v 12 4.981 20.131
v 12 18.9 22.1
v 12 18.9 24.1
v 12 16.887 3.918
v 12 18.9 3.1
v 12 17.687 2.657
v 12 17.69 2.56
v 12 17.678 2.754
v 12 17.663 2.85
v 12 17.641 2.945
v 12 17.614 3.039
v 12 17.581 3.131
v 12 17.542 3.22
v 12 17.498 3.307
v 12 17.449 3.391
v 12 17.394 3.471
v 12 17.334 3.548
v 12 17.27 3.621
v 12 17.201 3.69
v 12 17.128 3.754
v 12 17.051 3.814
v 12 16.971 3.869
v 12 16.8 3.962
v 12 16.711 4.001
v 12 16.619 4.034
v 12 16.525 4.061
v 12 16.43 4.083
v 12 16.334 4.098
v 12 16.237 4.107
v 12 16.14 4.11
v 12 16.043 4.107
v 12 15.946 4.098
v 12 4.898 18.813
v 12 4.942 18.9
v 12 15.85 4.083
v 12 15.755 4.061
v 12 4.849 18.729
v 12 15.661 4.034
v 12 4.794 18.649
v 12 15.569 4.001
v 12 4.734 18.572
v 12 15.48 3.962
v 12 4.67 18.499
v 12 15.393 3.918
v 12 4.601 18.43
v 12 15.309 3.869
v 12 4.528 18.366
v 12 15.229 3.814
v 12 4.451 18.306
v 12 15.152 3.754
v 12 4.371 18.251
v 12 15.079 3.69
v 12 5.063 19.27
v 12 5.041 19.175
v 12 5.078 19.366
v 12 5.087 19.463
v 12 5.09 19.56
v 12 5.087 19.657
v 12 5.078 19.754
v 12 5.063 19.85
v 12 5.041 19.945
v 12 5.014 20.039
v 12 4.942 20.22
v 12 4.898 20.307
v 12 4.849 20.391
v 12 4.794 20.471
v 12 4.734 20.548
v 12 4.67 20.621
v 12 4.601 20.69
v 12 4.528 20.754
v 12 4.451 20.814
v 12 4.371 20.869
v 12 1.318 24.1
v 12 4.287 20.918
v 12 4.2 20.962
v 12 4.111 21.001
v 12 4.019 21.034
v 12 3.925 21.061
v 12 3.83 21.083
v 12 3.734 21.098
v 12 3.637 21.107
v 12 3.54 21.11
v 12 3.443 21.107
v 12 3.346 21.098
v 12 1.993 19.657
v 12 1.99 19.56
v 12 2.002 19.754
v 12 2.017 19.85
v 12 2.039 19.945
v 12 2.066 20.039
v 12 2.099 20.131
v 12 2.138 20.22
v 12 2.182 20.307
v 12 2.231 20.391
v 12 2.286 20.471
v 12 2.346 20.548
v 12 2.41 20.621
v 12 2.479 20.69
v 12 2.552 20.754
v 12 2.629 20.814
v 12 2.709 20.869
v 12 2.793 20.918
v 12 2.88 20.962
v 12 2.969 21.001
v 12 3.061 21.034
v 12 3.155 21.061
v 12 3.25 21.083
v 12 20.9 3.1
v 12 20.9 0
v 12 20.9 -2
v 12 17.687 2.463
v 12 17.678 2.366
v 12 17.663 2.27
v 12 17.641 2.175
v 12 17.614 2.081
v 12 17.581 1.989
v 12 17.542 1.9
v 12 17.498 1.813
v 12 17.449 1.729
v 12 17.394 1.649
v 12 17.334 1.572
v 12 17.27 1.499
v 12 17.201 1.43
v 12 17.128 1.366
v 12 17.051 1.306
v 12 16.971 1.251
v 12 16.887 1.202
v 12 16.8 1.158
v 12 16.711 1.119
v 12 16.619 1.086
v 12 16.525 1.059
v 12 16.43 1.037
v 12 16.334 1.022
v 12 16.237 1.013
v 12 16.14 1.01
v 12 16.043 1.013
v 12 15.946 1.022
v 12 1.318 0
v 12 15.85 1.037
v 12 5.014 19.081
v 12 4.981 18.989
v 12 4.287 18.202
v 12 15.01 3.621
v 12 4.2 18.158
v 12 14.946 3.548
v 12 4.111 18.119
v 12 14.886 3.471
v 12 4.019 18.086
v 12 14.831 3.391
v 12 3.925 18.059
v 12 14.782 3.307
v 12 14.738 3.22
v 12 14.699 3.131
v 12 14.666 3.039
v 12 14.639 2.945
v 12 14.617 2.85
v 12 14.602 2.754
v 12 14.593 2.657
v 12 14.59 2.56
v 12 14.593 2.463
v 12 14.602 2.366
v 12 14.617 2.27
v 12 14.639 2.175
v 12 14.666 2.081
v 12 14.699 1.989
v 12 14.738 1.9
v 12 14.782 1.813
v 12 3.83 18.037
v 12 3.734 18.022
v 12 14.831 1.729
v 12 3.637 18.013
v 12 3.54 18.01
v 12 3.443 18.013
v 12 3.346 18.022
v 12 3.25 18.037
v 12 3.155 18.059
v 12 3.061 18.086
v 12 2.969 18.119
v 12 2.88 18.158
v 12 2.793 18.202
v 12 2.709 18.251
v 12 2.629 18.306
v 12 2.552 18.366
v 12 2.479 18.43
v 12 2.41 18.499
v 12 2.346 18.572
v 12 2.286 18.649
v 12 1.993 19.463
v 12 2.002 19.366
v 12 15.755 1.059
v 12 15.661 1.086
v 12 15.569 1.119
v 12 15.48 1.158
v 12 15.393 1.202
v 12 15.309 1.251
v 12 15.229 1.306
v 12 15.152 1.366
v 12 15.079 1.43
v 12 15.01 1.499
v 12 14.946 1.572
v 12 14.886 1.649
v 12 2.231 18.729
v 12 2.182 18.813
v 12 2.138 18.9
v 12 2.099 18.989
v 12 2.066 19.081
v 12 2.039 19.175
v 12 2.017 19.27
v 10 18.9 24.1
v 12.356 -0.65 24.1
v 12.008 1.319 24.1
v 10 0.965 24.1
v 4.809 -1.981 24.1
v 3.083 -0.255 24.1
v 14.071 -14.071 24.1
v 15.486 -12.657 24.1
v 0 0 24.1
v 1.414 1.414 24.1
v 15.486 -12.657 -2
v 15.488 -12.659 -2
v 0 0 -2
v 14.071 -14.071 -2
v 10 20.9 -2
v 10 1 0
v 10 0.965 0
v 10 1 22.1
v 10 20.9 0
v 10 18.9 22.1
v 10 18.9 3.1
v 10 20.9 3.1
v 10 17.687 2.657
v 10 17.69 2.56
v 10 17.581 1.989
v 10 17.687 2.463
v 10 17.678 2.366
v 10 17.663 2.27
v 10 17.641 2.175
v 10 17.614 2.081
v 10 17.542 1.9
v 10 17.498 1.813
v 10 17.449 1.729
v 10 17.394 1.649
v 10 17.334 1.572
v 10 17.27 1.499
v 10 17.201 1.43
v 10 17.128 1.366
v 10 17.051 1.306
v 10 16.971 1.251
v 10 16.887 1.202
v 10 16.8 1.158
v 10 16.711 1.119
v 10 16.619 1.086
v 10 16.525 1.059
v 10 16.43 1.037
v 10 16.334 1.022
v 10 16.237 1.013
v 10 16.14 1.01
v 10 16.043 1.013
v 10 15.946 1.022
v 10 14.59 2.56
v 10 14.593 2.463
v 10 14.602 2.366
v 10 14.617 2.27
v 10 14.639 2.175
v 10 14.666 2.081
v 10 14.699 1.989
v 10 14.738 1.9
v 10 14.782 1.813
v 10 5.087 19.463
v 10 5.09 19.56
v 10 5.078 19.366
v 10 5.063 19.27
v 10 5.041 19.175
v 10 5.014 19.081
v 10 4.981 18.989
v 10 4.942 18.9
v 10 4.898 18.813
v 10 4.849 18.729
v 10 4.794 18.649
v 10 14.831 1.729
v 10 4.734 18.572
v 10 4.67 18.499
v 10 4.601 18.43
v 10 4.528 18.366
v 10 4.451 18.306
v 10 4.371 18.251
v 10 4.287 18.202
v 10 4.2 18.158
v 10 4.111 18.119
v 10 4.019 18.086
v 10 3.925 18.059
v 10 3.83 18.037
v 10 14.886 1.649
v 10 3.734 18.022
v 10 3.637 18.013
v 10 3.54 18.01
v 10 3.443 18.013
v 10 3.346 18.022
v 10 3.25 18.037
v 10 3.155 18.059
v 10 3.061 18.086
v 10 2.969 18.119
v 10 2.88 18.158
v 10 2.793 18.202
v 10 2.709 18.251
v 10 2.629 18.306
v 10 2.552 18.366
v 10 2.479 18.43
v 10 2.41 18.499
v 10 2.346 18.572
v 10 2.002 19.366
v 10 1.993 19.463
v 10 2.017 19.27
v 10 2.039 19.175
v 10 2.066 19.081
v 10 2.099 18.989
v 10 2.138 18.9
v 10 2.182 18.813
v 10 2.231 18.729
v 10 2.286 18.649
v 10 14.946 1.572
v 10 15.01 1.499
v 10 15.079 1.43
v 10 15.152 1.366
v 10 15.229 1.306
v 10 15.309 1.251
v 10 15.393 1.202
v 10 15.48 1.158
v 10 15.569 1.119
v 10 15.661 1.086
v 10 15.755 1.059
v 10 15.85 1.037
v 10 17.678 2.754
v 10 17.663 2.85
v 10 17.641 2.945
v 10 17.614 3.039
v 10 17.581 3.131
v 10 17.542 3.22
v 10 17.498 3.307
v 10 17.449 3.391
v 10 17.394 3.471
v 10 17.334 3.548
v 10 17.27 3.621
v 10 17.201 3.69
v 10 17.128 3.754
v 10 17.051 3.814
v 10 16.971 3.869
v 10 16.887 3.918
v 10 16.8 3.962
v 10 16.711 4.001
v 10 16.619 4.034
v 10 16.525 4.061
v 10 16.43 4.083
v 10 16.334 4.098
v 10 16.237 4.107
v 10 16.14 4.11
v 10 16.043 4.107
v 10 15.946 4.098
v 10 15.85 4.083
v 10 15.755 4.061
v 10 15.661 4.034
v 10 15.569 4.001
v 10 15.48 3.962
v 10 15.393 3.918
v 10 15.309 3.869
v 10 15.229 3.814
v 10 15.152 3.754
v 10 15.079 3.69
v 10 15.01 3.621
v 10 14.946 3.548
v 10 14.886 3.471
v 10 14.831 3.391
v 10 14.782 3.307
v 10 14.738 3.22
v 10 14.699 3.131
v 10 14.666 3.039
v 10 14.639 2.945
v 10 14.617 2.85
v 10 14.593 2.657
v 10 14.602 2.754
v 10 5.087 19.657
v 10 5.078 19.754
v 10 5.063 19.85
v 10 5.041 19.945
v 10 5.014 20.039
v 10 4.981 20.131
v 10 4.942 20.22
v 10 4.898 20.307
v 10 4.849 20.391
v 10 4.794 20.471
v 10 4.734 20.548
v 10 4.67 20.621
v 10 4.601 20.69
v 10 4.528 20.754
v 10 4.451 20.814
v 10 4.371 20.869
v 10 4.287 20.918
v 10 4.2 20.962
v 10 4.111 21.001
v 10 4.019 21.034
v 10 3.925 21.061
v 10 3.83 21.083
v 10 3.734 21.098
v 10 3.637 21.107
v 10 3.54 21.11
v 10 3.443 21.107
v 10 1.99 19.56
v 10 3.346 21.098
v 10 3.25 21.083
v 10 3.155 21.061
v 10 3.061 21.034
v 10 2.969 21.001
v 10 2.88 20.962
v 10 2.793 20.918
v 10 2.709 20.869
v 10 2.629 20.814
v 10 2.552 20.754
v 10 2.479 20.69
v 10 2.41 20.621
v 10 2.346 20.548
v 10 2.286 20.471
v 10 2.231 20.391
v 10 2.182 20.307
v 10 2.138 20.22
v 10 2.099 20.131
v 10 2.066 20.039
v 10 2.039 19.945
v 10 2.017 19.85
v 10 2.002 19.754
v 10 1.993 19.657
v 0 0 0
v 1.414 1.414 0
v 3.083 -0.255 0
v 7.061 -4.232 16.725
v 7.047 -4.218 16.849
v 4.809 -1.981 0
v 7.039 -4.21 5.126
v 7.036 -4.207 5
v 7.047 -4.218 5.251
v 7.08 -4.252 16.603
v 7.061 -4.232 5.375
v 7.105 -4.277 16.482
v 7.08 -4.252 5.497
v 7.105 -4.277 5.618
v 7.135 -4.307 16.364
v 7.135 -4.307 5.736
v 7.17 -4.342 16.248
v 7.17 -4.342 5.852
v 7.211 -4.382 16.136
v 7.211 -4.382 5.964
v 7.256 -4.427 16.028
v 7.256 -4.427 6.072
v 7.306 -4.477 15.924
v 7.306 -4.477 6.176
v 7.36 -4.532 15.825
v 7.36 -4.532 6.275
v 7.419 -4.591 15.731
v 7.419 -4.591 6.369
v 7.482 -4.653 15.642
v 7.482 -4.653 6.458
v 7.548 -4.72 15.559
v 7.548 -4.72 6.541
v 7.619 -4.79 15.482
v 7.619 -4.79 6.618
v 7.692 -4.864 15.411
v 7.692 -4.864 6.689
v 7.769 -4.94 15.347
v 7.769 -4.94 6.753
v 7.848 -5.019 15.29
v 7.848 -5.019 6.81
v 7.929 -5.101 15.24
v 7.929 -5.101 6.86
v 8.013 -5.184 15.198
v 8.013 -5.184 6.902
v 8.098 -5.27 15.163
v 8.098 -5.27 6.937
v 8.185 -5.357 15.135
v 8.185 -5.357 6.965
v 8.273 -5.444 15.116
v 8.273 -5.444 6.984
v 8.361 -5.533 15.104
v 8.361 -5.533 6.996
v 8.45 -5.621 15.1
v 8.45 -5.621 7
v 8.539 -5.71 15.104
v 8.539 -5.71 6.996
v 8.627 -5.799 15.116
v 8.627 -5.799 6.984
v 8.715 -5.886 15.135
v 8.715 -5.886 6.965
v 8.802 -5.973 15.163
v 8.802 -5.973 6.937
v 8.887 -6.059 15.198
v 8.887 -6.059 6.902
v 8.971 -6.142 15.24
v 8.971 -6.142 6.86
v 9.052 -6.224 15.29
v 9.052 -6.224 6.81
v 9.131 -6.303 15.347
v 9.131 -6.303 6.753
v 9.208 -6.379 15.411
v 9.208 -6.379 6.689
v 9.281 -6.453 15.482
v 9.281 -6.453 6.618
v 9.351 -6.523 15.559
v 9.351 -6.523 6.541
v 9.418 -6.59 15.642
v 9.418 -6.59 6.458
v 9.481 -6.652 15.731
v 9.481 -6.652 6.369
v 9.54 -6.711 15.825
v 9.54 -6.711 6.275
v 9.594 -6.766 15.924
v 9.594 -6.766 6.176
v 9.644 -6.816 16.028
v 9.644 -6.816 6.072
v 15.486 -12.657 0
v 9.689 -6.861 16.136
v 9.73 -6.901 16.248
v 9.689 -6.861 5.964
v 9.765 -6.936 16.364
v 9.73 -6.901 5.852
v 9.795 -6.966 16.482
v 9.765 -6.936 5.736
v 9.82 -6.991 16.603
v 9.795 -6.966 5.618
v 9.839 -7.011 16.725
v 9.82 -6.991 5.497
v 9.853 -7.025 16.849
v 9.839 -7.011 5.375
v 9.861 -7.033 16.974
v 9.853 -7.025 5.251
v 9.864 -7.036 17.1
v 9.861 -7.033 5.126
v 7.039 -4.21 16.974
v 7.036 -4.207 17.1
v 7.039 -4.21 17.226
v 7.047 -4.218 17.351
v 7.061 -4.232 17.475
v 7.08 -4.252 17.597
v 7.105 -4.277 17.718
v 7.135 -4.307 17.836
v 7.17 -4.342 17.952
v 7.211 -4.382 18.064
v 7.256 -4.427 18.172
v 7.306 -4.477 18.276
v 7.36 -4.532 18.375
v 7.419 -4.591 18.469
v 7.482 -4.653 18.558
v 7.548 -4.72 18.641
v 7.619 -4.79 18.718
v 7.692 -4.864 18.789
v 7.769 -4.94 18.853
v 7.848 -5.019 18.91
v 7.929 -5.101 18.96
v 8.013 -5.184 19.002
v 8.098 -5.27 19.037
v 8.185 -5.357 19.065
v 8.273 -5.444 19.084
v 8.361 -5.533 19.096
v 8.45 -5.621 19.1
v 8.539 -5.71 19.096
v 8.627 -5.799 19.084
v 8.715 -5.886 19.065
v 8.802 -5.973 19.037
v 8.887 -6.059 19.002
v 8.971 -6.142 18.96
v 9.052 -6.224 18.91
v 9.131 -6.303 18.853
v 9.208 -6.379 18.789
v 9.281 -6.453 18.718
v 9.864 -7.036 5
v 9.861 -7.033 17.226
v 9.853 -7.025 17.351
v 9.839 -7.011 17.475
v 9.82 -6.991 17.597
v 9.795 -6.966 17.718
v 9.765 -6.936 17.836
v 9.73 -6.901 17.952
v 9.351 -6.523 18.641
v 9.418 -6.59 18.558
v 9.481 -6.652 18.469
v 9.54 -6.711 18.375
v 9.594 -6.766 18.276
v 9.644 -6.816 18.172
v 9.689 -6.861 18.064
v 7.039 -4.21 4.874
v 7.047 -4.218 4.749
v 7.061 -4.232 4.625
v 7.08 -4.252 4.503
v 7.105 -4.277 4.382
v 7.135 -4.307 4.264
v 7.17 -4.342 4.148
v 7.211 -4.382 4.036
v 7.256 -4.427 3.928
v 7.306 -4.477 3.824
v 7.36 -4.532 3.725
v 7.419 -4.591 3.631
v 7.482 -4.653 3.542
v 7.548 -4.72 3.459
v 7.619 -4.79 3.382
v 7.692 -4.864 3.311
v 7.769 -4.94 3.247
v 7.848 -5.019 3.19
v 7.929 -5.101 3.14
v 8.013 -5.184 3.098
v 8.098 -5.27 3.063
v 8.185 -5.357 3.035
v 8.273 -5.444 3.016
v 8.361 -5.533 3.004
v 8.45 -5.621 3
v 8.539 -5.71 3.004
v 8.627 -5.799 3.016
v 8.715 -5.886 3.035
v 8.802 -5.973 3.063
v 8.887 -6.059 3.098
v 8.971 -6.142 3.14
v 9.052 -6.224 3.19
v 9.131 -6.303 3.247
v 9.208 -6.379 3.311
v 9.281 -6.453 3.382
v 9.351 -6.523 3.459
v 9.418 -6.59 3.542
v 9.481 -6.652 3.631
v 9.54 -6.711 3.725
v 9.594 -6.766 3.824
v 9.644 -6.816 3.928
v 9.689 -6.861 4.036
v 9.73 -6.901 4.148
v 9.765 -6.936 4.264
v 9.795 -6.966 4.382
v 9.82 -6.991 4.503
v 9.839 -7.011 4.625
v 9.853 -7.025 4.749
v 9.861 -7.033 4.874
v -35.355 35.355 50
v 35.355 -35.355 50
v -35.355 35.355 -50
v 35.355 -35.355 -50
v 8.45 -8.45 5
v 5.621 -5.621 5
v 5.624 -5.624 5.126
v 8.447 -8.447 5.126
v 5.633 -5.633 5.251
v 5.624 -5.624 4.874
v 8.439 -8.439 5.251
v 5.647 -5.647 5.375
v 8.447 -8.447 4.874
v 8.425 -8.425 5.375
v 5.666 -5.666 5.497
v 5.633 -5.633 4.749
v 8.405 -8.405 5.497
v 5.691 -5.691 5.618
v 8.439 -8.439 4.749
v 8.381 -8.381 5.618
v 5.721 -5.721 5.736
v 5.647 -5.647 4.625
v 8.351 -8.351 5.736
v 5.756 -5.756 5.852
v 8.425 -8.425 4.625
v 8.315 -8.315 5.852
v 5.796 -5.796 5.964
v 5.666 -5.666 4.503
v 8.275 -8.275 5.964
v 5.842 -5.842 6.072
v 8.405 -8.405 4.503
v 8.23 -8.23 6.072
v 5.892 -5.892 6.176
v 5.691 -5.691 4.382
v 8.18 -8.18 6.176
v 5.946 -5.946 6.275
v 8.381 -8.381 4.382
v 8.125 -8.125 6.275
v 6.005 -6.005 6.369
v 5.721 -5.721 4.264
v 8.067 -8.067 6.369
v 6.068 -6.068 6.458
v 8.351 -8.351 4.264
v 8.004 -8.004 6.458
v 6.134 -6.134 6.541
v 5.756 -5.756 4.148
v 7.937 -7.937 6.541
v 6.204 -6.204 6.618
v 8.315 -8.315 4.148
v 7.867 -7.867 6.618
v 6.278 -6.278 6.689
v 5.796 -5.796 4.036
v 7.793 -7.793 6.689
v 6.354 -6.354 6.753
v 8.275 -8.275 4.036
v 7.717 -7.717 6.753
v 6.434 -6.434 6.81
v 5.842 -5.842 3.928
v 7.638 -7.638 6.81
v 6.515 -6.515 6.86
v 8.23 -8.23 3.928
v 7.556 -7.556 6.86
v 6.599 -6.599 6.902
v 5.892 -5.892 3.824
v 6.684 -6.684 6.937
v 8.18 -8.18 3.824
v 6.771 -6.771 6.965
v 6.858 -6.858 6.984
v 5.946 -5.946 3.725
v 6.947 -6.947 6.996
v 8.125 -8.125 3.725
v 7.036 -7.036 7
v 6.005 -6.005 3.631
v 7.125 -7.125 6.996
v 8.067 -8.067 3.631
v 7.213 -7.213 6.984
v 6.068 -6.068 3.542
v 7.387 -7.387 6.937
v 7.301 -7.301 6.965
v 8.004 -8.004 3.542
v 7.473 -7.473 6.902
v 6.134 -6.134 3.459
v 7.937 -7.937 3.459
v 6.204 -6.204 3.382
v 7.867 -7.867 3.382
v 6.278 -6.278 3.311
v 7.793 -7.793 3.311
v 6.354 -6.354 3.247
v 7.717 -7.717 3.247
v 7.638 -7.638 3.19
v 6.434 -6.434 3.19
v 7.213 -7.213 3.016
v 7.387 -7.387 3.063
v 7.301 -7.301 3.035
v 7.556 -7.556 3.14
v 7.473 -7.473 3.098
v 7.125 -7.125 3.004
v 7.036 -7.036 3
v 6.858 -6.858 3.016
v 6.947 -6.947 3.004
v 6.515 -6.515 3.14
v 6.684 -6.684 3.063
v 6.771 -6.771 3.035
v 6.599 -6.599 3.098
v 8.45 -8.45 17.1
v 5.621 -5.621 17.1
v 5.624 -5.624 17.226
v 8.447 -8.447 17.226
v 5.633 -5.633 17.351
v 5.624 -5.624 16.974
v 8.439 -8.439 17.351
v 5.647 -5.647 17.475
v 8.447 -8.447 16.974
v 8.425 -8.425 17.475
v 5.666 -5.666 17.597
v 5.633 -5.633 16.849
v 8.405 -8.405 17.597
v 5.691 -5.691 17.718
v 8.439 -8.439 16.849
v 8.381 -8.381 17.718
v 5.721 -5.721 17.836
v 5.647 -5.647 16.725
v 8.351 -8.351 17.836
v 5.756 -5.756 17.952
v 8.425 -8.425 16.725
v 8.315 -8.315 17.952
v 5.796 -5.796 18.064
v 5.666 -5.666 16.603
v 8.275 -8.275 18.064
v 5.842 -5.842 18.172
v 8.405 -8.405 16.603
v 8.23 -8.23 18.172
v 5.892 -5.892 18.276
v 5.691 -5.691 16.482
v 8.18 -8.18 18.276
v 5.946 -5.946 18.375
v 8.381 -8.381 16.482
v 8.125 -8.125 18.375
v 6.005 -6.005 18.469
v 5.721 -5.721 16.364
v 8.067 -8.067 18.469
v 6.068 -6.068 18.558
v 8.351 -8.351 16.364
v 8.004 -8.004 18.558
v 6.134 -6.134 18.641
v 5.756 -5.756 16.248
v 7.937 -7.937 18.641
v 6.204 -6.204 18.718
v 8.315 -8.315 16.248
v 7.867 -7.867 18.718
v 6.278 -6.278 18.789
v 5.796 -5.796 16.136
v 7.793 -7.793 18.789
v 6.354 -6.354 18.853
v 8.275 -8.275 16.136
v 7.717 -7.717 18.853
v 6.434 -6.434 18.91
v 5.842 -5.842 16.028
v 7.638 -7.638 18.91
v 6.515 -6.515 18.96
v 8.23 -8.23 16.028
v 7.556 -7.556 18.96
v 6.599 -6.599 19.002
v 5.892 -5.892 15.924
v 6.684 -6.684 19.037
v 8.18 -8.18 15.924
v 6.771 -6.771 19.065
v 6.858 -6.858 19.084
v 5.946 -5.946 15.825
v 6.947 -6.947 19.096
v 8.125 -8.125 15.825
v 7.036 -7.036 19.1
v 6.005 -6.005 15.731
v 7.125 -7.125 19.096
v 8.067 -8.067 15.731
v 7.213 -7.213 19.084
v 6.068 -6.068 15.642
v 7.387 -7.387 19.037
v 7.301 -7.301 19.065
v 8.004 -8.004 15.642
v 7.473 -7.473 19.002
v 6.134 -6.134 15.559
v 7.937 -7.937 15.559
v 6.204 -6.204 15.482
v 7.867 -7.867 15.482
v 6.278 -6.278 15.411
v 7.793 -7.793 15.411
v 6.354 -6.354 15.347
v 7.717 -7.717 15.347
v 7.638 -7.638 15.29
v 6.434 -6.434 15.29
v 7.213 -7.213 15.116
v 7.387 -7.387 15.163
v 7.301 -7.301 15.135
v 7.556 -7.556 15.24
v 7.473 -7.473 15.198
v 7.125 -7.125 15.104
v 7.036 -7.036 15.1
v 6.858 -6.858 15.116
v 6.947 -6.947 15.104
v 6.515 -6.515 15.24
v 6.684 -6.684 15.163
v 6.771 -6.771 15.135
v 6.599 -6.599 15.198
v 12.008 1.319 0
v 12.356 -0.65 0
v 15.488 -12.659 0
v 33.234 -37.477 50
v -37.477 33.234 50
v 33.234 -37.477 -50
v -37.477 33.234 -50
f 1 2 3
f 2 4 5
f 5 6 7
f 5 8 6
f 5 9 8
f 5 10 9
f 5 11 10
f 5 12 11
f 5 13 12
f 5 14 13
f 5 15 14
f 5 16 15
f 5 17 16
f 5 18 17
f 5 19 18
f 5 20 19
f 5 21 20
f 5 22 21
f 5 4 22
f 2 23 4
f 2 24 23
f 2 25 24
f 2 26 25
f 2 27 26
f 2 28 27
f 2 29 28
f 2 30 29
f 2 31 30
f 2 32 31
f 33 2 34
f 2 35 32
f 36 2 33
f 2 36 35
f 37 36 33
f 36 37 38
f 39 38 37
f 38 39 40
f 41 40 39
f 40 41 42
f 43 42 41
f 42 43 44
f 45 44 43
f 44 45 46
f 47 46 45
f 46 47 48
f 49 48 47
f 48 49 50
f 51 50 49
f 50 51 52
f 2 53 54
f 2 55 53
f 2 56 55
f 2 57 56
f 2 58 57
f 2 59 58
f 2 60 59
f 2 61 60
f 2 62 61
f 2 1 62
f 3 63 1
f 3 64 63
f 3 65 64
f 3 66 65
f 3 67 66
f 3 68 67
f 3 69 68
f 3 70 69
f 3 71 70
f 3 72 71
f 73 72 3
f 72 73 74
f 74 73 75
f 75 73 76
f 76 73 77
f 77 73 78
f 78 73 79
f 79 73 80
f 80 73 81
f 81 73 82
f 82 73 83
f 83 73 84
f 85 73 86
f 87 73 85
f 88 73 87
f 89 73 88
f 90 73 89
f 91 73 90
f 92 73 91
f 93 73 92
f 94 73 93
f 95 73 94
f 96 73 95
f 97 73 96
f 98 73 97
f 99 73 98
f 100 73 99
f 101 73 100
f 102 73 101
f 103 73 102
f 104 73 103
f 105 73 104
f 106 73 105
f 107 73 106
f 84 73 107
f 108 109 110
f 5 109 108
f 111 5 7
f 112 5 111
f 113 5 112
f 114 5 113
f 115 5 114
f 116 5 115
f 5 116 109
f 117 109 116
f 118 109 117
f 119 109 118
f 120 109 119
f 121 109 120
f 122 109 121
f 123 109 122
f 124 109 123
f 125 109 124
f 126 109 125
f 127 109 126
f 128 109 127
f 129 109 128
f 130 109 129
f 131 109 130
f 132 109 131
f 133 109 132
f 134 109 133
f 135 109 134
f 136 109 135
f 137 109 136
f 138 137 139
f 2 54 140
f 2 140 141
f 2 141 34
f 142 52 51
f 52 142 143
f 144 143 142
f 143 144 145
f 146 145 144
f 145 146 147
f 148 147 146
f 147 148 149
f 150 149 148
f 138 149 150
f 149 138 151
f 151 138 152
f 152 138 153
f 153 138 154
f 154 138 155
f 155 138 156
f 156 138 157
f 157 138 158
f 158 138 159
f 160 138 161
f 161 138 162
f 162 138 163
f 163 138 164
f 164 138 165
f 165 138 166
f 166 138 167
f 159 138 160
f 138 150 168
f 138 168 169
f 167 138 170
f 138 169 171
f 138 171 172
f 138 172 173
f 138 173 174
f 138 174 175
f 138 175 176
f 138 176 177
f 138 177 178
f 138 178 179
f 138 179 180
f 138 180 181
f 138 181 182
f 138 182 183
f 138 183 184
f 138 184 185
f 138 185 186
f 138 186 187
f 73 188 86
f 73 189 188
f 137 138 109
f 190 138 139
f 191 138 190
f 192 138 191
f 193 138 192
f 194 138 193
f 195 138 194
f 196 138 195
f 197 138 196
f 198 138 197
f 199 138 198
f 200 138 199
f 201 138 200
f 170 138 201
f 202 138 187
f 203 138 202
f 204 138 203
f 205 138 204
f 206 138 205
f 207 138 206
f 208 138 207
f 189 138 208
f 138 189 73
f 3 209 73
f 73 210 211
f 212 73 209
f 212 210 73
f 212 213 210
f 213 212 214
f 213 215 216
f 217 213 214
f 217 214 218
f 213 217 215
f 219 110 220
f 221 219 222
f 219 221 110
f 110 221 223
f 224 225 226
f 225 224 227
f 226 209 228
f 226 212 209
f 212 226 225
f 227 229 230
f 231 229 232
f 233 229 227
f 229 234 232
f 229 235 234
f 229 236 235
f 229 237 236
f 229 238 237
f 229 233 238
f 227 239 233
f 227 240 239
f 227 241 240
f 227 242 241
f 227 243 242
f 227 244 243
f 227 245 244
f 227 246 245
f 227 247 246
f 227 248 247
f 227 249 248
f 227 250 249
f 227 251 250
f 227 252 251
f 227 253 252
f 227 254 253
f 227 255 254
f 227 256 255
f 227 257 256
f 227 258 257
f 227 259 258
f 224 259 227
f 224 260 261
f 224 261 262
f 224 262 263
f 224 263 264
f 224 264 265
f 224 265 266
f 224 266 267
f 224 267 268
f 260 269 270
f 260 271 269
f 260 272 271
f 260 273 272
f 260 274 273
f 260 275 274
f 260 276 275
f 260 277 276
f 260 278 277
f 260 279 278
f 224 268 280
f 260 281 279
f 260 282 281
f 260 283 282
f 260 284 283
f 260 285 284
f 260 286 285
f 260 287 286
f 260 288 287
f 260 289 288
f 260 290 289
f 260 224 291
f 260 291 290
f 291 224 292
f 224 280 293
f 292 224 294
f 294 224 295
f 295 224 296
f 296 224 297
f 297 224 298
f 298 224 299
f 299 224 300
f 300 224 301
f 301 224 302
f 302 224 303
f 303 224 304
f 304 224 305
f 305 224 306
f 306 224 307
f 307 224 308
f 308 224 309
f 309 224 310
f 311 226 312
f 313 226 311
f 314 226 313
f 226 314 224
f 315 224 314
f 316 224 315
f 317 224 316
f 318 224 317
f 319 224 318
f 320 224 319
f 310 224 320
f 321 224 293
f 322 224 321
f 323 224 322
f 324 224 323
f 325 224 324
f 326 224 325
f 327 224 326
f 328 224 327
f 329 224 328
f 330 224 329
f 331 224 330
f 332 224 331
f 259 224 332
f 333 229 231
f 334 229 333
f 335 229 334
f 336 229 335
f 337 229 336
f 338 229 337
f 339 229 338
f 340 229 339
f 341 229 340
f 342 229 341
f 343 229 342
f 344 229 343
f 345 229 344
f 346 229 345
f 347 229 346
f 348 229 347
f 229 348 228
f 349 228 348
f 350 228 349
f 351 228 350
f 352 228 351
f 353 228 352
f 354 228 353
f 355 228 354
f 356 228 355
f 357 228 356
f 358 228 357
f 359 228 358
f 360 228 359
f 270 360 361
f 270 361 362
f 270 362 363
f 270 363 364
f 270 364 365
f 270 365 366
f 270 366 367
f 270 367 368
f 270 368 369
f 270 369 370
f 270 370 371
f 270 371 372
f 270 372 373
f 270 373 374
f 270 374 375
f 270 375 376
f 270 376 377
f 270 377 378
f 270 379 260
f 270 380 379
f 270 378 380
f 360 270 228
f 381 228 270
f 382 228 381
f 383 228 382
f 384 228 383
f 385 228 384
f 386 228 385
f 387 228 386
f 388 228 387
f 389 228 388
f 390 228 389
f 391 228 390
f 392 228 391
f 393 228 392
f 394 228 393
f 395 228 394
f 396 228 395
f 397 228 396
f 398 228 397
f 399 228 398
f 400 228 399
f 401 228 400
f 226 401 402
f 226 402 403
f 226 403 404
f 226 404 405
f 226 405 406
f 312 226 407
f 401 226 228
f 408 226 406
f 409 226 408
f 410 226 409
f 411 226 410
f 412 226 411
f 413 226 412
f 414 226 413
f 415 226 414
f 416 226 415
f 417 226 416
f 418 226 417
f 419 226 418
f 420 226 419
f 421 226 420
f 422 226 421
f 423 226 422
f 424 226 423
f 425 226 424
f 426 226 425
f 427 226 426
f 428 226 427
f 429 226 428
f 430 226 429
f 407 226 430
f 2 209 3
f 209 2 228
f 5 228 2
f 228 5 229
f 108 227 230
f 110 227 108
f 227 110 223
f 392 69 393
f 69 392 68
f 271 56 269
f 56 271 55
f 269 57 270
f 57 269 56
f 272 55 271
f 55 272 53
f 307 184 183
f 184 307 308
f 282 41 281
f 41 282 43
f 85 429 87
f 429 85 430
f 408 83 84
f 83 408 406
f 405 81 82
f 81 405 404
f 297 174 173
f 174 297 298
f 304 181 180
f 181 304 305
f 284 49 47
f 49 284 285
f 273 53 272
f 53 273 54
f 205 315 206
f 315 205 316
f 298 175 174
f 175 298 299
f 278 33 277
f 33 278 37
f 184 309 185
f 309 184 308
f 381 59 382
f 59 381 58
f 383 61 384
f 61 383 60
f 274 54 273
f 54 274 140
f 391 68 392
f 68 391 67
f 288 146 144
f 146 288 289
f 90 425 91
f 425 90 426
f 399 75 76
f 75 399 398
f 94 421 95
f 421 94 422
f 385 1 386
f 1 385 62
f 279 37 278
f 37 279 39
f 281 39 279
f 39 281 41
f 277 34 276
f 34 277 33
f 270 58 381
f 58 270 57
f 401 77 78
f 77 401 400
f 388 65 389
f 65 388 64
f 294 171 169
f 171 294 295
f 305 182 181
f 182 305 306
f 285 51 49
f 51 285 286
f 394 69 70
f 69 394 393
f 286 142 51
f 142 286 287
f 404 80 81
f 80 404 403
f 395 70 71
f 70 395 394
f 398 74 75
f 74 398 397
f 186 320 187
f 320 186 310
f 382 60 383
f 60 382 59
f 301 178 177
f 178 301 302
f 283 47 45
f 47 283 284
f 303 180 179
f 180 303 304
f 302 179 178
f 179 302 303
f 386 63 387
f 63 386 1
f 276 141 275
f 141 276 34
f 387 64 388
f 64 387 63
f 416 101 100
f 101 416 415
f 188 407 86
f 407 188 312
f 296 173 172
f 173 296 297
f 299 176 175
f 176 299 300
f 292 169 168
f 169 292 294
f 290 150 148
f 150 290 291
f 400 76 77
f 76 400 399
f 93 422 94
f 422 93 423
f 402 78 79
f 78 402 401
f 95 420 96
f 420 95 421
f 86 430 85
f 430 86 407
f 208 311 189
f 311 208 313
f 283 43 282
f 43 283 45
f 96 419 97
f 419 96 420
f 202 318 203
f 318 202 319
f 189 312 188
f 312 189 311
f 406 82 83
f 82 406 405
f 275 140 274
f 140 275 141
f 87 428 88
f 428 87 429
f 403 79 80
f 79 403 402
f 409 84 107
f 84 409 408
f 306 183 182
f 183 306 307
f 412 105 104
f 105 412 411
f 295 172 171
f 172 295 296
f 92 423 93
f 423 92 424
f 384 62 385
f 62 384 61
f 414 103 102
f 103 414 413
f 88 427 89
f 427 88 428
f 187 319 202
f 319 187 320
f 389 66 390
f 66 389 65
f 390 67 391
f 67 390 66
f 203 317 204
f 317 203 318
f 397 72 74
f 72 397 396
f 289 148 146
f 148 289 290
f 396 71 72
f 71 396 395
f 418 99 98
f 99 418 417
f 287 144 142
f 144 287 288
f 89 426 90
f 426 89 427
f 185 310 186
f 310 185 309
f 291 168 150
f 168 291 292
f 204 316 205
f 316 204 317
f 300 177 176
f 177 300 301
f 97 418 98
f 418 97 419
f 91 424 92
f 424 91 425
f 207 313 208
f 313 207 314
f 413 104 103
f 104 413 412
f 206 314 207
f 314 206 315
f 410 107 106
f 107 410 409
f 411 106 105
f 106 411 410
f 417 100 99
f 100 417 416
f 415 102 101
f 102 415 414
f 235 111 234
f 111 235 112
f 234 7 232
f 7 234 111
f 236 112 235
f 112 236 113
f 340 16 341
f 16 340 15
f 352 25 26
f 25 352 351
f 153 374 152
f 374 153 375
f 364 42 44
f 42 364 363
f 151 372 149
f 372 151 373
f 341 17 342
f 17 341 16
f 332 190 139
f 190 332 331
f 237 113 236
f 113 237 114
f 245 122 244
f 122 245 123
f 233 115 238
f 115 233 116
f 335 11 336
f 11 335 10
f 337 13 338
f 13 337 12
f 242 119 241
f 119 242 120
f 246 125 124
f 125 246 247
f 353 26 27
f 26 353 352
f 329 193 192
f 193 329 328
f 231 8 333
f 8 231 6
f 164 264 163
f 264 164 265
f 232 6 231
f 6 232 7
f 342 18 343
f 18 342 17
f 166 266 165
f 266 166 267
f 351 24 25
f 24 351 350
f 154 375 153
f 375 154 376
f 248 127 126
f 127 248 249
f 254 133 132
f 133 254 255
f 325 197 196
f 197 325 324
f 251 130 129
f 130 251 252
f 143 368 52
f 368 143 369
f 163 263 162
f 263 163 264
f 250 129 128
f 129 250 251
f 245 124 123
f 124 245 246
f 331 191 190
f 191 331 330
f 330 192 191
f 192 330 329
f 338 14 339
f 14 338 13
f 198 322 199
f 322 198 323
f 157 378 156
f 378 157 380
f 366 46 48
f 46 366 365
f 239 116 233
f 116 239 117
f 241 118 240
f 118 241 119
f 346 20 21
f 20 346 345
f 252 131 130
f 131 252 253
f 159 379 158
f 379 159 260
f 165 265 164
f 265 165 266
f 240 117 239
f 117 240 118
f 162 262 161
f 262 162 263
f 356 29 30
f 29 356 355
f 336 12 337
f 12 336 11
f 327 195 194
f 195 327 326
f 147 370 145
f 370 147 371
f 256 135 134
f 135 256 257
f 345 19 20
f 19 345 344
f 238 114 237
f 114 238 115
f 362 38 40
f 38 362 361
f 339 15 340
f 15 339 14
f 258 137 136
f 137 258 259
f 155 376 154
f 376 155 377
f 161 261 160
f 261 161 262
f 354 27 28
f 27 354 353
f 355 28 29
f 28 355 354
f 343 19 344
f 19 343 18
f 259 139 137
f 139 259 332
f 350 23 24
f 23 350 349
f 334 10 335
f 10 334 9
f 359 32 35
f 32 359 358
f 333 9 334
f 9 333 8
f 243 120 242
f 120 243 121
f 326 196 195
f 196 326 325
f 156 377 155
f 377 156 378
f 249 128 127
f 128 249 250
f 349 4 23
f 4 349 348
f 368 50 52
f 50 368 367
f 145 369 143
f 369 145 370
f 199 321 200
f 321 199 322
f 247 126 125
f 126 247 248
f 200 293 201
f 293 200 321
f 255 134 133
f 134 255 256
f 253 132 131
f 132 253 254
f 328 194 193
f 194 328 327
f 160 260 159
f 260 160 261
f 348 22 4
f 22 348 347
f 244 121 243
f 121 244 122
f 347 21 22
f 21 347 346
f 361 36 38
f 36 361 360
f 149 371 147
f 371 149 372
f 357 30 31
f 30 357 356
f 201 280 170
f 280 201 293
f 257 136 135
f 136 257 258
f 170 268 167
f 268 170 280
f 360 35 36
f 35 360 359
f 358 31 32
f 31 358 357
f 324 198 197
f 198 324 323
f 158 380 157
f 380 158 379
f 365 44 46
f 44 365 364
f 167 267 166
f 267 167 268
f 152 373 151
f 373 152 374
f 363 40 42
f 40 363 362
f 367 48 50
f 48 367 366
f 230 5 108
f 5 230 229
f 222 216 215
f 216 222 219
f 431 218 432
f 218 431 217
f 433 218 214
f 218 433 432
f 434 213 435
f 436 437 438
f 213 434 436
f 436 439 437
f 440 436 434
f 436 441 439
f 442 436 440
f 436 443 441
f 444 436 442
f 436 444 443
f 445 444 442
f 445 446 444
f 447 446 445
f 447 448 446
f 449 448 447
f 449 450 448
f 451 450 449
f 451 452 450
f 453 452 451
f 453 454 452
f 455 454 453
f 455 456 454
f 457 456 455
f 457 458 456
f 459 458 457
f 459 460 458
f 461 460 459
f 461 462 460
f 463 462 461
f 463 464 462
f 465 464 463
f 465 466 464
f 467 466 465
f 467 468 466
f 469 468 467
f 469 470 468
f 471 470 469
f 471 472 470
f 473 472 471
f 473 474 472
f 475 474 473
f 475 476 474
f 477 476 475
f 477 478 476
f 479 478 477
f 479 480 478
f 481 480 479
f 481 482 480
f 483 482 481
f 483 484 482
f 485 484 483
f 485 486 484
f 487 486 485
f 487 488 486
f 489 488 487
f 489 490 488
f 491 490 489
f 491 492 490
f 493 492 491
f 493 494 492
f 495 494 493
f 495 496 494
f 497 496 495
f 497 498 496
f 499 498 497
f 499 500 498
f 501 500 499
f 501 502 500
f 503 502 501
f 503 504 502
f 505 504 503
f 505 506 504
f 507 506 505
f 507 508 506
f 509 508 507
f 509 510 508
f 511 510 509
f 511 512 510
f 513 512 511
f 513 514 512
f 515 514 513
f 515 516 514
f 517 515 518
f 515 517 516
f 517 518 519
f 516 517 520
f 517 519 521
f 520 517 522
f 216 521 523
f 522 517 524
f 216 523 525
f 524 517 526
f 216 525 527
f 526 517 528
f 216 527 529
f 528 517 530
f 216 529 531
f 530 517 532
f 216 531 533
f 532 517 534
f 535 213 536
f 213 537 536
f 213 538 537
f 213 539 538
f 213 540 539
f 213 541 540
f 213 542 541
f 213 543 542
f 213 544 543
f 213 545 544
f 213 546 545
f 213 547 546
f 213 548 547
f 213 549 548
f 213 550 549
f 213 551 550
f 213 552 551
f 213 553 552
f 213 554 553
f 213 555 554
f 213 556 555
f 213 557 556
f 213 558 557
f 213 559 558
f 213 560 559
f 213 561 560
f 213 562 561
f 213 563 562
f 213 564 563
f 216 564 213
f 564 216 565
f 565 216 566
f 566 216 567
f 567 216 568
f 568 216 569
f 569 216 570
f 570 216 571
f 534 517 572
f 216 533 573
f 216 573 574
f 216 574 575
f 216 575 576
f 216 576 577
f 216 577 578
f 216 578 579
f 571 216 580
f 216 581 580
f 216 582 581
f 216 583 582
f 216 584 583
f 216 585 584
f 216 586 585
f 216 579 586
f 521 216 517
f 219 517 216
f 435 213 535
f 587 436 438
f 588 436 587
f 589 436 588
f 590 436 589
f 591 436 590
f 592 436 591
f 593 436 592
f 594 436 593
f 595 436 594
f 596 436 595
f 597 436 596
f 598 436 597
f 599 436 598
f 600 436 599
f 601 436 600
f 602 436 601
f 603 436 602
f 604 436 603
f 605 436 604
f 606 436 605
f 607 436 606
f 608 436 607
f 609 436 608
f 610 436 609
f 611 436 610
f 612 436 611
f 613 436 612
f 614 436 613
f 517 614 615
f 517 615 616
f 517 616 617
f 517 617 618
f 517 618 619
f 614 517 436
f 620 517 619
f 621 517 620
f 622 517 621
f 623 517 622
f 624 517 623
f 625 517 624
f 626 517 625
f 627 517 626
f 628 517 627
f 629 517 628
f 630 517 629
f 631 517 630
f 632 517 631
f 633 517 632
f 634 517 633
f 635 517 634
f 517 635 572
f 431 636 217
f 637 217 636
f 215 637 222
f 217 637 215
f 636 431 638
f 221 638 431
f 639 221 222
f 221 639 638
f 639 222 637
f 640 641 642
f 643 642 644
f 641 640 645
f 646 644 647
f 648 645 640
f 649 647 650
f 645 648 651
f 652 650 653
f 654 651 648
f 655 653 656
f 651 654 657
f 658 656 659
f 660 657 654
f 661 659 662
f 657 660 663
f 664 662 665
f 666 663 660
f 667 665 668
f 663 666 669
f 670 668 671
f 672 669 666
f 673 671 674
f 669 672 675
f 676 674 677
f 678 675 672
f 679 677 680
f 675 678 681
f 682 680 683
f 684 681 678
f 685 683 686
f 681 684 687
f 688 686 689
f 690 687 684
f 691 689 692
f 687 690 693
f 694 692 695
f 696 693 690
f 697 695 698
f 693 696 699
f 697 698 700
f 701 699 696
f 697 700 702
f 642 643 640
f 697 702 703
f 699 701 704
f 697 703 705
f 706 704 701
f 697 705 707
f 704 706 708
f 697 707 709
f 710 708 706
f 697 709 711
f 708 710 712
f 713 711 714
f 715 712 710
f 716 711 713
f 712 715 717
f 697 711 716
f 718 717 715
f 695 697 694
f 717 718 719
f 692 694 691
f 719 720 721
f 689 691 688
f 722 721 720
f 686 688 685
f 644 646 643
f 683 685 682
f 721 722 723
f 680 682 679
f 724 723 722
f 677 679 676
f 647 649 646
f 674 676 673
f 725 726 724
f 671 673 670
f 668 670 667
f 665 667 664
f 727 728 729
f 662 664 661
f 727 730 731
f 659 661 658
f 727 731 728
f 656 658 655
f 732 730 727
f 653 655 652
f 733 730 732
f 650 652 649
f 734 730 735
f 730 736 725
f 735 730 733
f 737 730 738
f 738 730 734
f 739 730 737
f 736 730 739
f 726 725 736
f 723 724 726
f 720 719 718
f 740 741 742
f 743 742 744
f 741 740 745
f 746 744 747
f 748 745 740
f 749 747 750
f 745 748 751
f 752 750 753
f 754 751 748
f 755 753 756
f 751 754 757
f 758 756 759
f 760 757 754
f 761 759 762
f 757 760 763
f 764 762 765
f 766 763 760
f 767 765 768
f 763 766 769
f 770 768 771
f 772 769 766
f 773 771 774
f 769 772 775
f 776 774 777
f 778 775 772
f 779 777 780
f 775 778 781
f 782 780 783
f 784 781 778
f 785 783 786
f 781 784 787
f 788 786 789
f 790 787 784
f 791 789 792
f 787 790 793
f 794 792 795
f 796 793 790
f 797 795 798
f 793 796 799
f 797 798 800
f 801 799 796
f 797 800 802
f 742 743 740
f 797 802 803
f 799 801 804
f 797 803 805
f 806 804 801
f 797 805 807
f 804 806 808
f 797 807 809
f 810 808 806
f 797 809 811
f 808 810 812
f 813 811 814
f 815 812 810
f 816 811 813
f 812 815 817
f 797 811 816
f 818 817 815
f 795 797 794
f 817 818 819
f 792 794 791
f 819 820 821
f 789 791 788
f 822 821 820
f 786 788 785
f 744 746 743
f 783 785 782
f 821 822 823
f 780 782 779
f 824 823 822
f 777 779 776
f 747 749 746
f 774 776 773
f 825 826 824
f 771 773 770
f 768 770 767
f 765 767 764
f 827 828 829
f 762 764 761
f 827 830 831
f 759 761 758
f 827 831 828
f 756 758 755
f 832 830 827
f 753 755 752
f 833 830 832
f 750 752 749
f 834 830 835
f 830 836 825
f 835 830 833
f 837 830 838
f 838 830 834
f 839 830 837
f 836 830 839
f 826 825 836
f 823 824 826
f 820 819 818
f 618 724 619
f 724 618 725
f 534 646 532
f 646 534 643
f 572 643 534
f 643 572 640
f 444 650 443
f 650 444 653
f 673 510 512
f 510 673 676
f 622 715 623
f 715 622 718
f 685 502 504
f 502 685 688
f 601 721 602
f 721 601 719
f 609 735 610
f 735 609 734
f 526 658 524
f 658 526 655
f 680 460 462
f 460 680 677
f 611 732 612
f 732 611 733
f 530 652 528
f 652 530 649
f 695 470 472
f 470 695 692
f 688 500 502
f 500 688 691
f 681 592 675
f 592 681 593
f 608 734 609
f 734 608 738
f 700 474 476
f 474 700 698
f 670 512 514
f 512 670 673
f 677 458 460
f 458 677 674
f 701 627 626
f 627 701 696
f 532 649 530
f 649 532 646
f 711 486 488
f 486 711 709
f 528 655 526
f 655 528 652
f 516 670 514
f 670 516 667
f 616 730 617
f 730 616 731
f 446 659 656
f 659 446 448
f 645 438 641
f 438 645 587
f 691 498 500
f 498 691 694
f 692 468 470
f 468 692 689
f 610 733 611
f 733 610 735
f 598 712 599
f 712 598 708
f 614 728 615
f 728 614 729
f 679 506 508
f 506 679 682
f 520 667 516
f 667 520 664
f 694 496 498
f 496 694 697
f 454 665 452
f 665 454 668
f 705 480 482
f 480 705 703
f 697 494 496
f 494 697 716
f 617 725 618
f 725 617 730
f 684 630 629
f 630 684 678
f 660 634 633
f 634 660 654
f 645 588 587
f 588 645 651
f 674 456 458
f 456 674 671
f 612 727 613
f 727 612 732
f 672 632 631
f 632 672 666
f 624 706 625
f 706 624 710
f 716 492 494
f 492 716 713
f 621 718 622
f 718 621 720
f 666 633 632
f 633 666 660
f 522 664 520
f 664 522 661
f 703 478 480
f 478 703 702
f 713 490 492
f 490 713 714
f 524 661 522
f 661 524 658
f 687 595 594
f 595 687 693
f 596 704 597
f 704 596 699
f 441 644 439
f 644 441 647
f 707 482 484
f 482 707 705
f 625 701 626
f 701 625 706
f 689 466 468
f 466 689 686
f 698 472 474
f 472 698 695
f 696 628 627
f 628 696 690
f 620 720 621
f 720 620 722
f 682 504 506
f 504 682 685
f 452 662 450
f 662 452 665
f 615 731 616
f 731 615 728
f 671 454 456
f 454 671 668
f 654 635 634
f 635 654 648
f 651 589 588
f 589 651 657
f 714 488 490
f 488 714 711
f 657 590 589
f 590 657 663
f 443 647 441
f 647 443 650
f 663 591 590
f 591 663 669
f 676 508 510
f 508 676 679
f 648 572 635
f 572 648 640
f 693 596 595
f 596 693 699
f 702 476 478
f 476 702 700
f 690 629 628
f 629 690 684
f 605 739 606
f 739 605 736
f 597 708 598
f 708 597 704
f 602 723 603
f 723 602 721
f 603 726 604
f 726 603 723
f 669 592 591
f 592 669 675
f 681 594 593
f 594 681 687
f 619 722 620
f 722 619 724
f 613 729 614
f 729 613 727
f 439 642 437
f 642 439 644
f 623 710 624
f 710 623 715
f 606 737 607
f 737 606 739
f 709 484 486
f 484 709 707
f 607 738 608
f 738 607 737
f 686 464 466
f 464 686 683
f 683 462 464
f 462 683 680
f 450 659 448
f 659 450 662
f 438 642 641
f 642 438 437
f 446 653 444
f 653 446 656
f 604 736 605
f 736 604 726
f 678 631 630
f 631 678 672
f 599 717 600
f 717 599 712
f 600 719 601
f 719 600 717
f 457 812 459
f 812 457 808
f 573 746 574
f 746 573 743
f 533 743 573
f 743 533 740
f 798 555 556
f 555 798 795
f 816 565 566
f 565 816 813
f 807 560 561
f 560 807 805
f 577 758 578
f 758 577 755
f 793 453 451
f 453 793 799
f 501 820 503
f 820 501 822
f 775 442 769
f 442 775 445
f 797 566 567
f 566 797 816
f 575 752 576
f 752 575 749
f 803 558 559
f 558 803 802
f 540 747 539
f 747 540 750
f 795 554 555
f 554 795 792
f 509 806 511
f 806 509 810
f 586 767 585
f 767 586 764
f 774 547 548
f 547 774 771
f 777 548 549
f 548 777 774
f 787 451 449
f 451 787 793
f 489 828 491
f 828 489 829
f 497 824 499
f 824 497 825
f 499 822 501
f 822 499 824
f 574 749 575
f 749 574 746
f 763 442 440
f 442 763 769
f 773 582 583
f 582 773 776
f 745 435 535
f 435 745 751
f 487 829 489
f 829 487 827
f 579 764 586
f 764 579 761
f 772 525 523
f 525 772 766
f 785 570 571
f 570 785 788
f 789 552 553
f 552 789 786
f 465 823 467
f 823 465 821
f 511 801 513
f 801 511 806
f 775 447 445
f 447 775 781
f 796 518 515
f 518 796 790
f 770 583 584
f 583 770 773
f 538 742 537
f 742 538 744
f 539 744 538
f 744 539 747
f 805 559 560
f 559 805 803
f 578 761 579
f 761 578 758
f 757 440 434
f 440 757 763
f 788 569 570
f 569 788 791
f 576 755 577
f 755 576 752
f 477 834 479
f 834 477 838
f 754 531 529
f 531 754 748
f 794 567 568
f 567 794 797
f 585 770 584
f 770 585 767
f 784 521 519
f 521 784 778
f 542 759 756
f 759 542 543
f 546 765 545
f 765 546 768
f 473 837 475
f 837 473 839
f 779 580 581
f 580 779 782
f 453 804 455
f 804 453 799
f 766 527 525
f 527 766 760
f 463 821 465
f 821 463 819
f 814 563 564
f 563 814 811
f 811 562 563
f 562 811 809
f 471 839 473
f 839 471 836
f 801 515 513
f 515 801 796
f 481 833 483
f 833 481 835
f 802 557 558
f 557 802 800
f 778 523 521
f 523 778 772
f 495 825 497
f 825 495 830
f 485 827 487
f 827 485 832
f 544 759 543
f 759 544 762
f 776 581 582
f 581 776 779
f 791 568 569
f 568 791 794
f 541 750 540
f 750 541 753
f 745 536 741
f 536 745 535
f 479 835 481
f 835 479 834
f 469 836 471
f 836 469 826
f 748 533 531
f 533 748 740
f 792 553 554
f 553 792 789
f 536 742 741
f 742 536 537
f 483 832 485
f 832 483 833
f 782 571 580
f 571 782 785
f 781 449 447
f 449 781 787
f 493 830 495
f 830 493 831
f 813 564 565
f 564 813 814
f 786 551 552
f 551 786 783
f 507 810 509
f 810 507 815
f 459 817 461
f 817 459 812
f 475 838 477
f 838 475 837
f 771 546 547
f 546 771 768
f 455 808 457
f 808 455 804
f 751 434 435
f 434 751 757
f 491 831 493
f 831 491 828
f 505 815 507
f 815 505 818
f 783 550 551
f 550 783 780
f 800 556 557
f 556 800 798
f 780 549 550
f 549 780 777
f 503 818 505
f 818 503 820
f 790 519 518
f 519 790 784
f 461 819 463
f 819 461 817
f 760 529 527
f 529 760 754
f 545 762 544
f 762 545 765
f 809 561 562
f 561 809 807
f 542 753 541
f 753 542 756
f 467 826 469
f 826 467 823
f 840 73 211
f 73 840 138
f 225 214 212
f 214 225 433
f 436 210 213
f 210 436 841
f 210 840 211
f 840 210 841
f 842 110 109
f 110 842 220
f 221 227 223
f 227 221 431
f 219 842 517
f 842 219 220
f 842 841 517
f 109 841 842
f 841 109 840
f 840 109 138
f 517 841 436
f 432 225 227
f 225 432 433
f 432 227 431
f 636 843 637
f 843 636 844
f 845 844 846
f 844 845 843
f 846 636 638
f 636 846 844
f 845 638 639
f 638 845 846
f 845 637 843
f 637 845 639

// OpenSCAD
// file: capteur_US.scad
$fn=100;

capteurUS_largeur = 19.9;
capteurUS_longueur= 22.1;
capteurUS_ep_PCB= 1.7;

module vis_capteur() {
    translate([2.54,2.54])
        circle(d=3.1);
    translate([2.54+12.6,2.54+17])
        circle(d=3.1);
}
module capteur_US_base() {
    cube([capteurUS_largeur,capteurUS_longueur,capteurUS_ep_PCB]);
    translate([0,0,-10])linear_extrude(height=20)vis_capteur();
    translate([9,capteurUS_longueur/2])cylinder(d=16.4, h=15.5);
    translate([17.9,0,-7]) cube([2,19,7]);
}
module capteur_US() {
    translate([-capteurUS_largeur/2,-capteurUS_longueur/2])capteur_US_base();
}
// main file
$fn=50;
dia_trou_fixation=4;
include <capteur_US.scad>
// En imprimer 2 de 45
module support45() {
    // Attache sur le servo
    translate([10,0])
    difference() {
        translate([0,0,-2]) {
            translate([0,0])
                cube([2, capteurUS_largeur-1,capteurUS_longueur+4]);
            translate([0,1])
                cube([2,capteurUS_largeur,capteurUS_longueur]);
        }
        translate([0,capteurUS_largeur/2+1,capteurUS_longueur/2])
            rotate([-90,0,90])#capteur_US();
    }
    // Attache sur la plaque de plexy
    rotate([0,0,-45]) translate([0,2,-2])difference() {
        translate([0,-2])
            cube([capteurUS_largeur,2,capteurUS_longueur+4]);
        translate([capteurUS_largeur/2,0,7])rotate([90,0,0])
            cylinder(d=dia_trou_fixation, h=100);
        translate([capteurUS_largeur/2,0,capteurUS_longueur+4-7])
            rotate([90,0,0]) cylinder(d=dia_trou_fixation, h=100);
    }
    // Renfort
    translate([3,-3+0.7])
    rotate([0,0,10])
        translate([0,0,-2])
        cube([9.5,2,capteurUS_longueur+4]);
    translate([0,0,-2])linear_extrude(height=2) {
        polygon([
            [0,0],
            [10,capteurUS_largeur+1],
            [12,capteurUS_largeur+1],
            [( capteurUS_largeur+2)/1.414,
             (-capteurUS_largeur+2)/1.414]]);
    }
}
rotate([0,0,45])translate([-3/2,0,0])#cube([3,100,100], center=true);
support45();

module support90() {
    difference() {
        mirror([1,1,0]) {
            translate([-1,0,-2])
                cube([capteurUS_largeur-1,2,capteurUS_longueur+4]);
            translate([0,0,-2])
                cube([capteurUS_largeur,2,capteurUS_longueur]);
            
            translate([0,0,-2])linear_extrude(height=2) {
                polygon([
                    [0,0],
                    [capteurUS_largeur,2],
                    [0, capteurUS_largeur]]);
            }
            translate([0,0,capteurUS_longueur])linear_extrude(height=2) {
                polygon([
                    [0,0],
                    [capteurUS_largeur-2,2],
                    [0, capteurUS_largeur]]);
            }
            translate([-2,0,0])rotate([0,0,90]) difference() {
                translate([0,-2,-2])
                    cube([capteurUS_largeur,2,capteurUS_longueur+4]);
                translate([capteurUS_largeur-7,0,5])rotate([90,0,0])
                    cylinder(d=dia_trou_fixation, h=100);
                translate([capteurUS_largeur-7,0,capteurUS_longueur-5])
                    rotate([90,0,0]) cylinder(d=dia_trou_fixation, h=100);
            }
            
        }
        
        
    translate([0,-capteurUS_largeur/2,capteurUS_longueur/2])
        rotate([-90,0,-90])#capteur_US();
    }
}
